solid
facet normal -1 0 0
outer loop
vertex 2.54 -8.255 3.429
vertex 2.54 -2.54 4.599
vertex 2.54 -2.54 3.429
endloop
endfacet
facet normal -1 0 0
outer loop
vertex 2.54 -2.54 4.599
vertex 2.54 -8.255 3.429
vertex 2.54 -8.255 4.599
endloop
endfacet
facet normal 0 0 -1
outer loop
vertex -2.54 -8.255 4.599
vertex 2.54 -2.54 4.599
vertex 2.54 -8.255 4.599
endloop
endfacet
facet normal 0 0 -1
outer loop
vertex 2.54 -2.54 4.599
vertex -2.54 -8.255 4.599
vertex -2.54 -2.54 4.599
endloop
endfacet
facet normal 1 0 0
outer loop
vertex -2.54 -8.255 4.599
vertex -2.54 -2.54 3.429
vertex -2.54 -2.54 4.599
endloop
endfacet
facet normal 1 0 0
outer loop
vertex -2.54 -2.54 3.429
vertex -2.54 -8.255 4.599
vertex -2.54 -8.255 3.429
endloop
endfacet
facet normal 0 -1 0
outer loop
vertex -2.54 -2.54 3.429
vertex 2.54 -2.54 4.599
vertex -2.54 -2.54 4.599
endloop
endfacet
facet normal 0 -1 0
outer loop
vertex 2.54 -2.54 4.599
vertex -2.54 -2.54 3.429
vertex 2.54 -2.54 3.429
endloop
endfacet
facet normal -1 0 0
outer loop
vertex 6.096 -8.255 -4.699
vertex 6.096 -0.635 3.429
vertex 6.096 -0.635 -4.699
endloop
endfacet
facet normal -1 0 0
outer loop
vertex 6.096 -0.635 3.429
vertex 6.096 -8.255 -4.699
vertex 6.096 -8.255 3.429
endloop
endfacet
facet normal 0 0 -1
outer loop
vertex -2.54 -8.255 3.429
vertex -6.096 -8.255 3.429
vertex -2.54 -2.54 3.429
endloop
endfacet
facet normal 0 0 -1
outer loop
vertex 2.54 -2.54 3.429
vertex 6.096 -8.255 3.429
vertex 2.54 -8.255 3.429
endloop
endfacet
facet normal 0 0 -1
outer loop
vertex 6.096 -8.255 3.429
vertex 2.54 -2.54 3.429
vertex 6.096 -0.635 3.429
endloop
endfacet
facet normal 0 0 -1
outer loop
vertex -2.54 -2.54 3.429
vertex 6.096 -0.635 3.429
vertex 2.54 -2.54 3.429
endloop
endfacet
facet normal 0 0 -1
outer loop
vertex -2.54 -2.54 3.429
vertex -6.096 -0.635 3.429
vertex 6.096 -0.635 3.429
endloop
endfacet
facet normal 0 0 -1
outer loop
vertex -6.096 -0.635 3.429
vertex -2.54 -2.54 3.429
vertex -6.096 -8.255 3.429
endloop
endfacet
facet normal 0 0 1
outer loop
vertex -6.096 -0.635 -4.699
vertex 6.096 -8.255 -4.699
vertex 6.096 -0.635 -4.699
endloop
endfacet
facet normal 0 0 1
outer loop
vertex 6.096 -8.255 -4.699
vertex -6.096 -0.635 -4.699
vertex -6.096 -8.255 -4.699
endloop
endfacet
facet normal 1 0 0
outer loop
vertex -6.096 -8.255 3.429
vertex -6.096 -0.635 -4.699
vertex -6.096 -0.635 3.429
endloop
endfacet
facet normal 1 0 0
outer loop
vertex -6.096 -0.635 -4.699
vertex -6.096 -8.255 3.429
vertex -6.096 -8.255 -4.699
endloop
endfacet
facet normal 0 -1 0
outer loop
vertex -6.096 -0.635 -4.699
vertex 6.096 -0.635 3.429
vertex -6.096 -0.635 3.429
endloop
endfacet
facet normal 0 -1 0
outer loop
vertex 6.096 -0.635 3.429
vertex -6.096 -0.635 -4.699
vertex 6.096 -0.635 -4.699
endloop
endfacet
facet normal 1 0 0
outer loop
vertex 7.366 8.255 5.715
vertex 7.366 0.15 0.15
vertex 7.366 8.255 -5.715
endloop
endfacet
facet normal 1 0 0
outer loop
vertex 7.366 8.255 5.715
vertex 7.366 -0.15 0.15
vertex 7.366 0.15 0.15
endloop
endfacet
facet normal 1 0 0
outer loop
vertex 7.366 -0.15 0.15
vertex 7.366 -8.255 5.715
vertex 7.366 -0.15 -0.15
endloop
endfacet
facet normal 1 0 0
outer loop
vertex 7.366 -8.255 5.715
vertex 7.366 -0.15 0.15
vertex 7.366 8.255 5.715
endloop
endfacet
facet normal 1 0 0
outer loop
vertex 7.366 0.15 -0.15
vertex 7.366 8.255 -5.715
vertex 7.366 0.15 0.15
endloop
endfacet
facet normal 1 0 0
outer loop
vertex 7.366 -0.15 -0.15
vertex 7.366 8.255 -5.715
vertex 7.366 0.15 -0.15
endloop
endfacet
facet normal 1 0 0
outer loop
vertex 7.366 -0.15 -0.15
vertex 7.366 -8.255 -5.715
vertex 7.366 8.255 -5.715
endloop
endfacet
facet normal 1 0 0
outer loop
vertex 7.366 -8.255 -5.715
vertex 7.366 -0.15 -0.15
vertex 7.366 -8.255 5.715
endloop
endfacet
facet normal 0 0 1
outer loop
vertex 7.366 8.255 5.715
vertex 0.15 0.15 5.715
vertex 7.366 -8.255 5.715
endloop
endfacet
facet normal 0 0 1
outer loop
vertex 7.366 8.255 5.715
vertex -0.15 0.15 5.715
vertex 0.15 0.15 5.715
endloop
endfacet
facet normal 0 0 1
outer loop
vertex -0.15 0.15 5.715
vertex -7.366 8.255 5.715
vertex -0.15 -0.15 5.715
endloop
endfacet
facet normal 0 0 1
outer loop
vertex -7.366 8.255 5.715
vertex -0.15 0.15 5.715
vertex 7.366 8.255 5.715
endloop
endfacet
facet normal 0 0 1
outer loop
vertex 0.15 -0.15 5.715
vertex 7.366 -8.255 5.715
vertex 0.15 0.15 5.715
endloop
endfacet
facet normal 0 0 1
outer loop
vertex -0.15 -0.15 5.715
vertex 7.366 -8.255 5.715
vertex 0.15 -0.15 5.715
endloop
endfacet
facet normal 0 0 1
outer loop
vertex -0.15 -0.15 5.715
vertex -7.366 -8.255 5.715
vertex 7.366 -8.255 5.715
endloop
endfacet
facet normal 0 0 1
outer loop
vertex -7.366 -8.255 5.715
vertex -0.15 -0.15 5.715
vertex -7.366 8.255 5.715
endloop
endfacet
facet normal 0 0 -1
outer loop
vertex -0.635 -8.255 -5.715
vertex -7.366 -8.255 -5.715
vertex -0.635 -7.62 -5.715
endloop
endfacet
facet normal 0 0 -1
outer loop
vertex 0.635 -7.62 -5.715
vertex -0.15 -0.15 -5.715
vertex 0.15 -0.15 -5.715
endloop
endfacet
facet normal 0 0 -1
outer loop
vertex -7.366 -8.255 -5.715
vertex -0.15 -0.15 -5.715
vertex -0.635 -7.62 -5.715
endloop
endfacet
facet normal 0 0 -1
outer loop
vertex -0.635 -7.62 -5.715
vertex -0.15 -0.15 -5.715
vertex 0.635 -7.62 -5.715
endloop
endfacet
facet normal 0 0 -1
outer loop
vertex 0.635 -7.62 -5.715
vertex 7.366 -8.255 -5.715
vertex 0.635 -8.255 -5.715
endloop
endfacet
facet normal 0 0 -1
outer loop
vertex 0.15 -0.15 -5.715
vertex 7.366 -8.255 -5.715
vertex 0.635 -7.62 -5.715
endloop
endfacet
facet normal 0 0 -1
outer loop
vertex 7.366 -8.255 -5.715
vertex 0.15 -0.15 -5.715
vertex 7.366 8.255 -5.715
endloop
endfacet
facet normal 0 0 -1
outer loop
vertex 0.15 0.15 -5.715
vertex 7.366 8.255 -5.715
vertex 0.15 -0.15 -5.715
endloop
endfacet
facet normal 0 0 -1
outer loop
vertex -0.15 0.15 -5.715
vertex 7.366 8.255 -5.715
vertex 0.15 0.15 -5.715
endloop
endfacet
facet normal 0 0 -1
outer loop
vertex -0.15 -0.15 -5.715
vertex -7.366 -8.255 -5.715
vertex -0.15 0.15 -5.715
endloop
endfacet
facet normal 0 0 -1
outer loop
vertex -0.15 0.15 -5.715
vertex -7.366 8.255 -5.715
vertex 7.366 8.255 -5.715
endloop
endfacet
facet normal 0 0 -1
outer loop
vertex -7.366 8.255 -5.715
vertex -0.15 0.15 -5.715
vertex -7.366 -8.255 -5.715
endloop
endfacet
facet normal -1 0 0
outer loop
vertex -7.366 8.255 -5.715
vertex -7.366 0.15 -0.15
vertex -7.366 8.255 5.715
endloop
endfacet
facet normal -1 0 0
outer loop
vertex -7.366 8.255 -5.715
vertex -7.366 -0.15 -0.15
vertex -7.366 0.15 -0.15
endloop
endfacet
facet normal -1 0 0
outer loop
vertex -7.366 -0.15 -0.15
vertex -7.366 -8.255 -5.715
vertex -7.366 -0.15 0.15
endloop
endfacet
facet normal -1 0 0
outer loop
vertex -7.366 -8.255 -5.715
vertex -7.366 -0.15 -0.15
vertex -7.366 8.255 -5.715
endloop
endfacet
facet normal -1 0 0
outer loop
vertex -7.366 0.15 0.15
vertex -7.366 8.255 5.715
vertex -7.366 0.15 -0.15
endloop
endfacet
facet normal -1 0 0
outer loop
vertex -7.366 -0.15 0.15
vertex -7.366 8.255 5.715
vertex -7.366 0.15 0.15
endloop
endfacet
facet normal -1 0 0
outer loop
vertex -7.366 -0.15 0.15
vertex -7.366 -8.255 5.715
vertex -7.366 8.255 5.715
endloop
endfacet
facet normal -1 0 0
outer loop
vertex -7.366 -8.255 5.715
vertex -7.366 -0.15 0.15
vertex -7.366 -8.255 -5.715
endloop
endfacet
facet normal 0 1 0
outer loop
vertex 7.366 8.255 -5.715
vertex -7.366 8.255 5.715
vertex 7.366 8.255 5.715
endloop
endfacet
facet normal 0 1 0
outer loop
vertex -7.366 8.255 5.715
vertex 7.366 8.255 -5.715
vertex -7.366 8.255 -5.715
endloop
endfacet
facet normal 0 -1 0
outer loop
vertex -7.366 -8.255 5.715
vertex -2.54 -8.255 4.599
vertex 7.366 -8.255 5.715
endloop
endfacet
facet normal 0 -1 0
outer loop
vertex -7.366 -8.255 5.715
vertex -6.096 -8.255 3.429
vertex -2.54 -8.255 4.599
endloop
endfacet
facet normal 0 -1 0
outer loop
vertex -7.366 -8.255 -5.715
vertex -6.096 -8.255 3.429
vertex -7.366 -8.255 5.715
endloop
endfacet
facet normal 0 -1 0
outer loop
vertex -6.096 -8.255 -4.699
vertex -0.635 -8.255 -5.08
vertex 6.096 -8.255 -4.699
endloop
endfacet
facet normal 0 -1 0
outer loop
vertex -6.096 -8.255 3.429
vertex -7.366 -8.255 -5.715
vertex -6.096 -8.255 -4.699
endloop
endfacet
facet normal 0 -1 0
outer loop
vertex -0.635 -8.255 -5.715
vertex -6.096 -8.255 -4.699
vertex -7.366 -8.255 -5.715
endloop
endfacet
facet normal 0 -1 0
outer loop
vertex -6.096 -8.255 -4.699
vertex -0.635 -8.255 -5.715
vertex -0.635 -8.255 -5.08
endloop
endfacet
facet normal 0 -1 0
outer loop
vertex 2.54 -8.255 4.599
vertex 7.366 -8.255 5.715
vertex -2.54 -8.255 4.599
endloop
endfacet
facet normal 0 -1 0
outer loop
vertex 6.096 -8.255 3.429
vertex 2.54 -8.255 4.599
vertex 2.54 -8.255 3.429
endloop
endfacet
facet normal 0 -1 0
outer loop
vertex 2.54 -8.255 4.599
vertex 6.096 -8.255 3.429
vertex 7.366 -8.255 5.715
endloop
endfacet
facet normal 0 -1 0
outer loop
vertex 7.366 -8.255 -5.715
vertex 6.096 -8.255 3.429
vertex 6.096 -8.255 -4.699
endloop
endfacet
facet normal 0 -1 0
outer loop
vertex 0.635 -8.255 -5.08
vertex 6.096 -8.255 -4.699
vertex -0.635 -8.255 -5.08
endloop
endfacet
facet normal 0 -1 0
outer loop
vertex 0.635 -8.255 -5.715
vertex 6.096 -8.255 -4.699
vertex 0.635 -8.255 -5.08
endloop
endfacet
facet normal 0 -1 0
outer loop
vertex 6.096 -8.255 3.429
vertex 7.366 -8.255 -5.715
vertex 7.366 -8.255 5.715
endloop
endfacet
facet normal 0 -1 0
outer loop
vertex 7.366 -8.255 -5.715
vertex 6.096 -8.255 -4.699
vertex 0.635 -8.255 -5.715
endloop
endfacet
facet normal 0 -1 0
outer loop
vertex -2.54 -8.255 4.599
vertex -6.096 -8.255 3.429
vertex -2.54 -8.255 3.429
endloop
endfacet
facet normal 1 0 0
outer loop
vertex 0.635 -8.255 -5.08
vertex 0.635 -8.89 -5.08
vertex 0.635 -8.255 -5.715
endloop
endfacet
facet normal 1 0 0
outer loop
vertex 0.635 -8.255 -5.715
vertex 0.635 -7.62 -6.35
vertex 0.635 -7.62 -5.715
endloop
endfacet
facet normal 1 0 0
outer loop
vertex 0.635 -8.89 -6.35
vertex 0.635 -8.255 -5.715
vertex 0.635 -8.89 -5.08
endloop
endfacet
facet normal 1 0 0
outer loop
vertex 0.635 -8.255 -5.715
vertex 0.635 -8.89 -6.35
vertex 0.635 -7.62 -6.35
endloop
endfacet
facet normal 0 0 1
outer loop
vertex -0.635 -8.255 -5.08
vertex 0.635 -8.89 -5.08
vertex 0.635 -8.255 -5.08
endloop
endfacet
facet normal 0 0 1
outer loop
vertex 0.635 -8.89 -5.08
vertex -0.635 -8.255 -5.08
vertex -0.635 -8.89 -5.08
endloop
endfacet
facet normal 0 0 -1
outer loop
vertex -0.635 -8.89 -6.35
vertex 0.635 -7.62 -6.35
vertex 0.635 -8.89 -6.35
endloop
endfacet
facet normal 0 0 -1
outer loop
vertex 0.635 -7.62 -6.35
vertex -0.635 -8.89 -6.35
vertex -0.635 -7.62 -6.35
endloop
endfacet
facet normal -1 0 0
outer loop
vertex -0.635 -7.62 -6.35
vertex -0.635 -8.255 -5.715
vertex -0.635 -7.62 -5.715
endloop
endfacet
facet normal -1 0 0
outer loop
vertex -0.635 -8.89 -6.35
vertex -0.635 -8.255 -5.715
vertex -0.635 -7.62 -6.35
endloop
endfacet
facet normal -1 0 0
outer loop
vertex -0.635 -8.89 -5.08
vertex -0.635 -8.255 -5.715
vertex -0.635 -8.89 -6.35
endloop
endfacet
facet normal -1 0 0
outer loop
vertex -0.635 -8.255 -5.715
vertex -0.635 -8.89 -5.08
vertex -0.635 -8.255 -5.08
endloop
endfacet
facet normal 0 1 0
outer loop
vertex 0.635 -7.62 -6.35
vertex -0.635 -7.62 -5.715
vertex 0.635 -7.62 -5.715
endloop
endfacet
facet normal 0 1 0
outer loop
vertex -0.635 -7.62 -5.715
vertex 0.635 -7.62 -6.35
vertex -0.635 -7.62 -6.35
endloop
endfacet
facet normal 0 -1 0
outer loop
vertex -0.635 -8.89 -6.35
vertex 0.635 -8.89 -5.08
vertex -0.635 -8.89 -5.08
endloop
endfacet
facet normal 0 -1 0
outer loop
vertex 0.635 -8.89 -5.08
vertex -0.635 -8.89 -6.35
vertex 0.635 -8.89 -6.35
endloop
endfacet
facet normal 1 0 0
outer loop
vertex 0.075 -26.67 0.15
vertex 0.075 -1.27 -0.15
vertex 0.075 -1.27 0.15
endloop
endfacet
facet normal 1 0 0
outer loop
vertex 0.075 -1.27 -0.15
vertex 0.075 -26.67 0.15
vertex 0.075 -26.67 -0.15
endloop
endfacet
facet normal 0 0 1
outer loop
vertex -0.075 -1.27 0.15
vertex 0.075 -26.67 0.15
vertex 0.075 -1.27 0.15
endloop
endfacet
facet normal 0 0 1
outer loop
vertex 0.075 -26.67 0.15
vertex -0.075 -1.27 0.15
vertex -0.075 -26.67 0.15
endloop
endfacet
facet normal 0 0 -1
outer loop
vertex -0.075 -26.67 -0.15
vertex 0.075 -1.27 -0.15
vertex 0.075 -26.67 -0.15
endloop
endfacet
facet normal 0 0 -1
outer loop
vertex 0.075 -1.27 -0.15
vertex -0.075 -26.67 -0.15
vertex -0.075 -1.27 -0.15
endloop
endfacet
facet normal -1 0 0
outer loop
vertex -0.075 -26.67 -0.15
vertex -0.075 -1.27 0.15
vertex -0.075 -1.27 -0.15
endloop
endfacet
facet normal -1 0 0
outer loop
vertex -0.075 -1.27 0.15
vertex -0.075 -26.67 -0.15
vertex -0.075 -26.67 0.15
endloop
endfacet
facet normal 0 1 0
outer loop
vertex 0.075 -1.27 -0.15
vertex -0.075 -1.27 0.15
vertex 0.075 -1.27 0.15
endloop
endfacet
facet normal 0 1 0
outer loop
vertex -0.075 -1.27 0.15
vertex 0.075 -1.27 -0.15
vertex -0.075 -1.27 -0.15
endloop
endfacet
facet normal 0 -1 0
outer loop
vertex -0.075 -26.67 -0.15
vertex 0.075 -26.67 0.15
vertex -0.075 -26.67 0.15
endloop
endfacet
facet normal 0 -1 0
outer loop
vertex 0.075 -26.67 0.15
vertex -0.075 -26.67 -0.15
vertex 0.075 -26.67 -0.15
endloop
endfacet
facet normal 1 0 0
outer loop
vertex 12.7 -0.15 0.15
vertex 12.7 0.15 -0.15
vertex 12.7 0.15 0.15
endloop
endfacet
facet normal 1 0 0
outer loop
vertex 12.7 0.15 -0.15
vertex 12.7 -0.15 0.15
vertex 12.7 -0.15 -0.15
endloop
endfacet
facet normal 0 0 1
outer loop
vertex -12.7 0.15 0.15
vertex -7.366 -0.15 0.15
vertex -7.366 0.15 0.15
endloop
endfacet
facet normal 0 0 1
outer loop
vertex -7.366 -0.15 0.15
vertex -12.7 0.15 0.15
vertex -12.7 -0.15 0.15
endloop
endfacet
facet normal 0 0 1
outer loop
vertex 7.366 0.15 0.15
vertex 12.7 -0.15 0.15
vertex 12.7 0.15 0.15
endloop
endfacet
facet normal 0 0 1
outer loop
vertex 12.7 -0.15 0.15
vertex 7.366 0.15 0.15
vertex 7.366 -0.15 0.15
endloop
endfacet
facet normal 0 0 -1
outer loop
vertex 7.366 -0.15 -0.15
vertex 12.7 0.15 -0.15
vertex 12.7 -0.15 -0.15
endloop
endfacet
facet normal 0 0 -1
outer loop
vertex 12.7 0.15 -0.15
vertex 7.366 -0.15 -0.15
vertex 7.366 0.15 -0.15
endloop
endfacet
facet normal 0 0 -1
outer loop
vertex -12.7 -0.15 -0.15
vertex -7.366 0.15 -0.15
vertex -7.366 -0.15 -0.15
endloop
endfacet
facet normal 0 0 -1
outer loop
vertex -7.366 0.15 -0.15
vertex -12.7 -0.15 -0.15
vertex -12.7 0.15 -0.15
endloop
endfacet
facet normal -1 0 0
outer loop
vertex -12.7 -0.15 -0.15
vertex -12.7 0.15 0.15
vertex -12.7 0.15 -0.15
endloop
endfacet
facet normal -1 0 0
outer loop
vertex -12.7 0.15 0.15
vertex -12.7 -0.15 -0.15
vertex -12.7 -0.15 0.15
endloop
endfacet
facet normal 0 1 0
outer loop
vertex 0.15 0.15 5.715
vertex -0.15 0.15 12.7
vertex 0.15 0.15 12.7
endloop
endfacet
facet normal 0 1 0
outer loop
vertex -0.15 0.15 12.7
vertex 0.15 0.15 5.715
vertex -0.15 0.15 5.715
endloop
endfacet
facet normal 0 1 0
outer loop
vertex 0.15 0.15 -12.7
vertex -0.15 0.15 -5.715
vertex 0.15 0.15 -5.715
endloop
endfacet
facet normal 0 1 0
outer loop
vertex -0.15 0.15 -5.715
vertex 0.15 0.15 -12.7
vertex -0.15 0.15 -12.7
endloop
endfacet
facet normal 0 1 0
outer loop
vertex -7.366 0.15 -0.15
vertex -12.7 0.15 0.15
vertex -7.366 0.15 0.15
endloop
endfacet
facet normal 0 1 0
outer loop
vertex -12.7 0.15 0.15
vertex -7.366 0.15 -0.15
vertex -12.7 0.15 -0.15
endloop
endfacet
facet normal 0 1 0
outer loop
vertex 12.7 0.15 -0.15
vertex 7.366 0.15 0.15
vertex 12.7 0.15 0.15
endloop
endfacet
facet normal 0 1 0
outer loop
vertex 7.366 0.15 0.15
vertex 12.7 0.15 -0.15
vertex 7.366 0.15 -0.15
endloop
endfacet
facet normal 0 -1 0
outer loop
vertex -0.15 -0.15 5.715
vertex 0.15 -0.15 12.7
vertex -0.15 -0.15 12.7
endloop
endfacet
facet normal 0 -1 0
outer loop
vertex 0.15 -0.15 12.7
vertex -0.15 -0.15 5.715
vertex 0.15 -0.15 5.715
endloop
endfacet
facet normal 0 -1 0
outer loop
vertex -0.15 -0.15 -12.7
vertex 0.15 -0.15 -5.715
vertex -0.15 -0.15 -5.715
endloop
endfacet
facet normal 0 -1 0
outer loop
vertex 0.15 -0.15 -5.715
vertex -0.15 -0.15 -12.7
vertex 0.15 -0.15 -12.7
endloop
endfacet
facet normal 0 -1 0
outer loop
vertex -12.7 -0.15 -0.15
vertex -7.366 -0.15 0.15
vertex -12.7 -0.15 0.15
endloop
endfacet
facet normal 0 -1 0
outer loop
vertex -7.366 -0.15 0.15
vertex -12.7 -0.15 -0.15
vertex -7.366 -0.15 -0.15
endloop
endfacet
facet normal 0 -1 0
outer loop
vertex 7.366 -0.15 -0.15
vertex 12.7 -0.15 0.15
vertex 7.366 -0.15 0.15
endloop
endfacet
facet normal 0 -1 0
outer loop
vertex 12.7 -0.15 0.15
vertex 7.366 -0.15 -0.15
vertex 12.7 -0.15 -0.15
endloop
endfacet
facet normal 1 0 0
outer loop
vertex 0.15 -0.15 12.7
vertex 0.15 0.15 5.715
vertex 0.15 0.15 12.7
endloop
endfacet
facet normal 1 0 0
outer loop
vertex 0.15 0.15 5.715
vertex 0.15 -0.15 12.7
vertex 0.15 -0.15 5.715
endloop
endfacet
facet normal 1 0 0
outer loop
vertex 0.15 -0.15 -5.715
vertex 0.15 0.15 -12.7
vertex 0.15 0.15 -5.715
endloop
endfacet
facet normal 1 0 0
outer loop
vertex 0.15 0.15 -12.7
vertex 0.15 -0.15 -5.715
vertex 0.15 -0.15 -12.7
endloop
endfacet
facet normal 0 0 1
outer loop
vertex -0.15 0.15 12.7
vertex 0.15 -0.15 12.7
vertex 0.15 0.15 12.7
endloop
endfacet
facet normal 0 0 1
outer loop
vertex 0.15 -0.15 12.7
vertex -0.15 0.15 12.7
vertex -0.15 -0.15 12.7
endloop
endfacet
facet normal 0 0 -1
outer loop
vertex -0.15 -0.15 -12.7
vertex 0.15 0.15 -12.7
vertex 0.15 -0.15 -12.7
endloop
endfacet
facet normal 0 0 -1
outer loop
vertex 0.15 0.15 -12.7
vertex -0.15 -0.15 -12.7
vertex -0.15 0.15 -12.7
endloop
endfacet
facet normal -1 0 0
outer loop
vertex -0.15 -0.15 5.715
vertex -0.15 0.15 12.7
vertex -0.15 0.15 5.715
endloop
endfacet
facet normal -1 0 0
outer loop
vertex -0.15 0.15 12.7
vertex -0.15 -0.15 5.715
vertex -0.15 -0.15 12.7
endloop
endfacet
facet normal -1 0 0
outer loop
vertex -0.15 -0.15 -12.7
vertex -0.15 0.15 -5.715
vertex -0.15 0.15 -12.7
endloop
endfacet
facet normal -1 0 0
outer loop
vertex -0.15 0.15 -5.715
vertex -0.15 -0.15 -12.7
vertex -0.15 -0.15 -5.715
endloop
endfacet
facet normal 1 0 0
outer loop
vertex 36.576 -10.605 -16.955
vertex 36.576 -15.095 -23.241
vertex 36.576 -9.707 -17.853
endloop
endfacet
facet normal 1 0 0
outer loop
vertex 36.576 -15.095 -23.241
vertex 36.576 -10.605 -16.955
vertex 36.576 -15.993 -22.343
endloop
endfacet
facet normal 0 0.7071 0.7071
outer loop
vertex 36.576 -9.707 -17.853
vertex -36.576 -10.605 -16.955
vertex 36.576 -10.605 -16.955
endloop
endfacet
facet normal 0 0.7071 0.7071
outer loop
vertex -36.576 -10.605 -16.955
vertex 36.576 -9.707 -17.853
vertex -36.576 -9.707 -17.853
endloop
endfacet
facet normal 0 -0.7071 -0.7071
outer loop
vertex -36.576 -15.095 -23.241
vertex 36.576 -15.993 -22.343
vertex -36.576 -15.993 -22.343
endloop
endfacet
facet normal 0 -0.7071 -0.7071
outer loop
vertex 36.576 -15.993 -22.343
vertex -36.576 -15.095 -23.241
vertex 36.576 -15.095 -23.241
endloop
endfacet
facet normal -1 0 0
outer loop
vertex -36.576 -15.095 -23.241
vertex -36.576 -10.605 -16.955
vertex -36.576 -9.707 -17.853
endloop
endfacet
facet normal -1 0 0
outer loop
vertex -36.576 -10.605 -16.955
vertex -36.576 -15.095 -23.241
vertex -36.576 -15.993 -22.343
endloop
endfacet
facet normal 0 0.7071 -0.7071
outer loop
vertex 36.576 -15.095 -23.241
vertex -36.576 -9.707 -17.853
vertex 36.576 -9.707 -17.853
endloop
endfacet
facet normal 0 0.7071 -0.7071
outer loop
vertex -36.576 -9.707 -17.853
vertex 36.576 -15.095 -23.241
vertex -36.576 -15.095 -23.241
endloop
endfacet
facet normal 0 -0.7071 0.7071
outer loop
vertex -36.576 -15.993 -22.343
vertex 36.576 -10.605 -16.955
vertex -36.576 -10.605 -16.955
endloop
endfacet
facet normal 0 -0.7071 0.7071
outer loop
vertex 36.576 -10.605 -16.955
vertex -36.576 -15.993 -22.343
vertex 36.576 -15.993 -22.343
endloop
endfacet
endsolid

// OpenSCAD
include <../mo/mo.scad>

moRJ45SocketSmall_Height = 0.65 * in;
moRJ45SocketSmall_Width = 0.58 * in;
moRJ45SocketSmall_Depth = 0.45 * in;
moRJ45SocketSmall_SideWall = 0.05 * in;
moRJ45SocketSmall_BottomWall = 0.05 * in;
moRJ45SocketSmall_TopWall = 0.08 * in;
moRJ45SocketSmall_BackWall = 0.35 * in;
moRJ45SocketSmall_TabHeight = 0.6 * in;
moRJ45SocketSmall_TabDepth = 0.05* in;
moRJ45SocketSmall_TabWidth = 0.2 * in;

positions = [ 
  [ [ 0, 0, 0 ], [ 0, 0, 1 ], 0 ],
  [ [ 0, -moRJ45SocketSmall_Height/2, -moRJ45SocketSmall_Depth/2 ], [ 1, 0, 0 ], 0 ]
];

module moRJ45SocketSmall( p = 0, info = false ) {
  moPresent( positions, p, info ) {
     color( Aluminum ) {
      difference() {
        cube( [ moRJ45SocketSmall_Width, moRJ45SocketSmall_Height, moRJ45SocketSmall_Depth ], center = true );
        translate( [ 0, -moRJ45SocketSmall_BackWall, -moRJ45SocketSmall_BottomWall/2 ] ) {
          translate( [ 0, -0.05*in, moRJ45SocketSmall_Depth / 2 - moRJ45SocketSmall_TopWall / 2 - Epsilon ] )
              cube( [ moRJ45SocketSmall_TabWidth, 
                      moRJ45SocketSmall_TabHeight, 
                      moRJ45SocketSmall_TabDepth ], center = true );
          cube( [ moRJ45SocketSmall_Width - 2 * moRJ45SocketSmall_SideWall, 
                  moRJ45SocketSmall_Height, 
                  moRJ45SocketSmall_Depth - moRJ45SocketSmall_TopWall - moRJ45SocketSmall_BottomWall ], center = true );
        }
        }
      }
    
  }
}


function moRJ45SocketSmallPosition( p = 0 ) = positions[ p ];

moMoveOriginTo( moRJ45SocketSmallPosition( 0 ) ) {
  moRJ45SocketSmall( 0, info = true, $name = true );
}
